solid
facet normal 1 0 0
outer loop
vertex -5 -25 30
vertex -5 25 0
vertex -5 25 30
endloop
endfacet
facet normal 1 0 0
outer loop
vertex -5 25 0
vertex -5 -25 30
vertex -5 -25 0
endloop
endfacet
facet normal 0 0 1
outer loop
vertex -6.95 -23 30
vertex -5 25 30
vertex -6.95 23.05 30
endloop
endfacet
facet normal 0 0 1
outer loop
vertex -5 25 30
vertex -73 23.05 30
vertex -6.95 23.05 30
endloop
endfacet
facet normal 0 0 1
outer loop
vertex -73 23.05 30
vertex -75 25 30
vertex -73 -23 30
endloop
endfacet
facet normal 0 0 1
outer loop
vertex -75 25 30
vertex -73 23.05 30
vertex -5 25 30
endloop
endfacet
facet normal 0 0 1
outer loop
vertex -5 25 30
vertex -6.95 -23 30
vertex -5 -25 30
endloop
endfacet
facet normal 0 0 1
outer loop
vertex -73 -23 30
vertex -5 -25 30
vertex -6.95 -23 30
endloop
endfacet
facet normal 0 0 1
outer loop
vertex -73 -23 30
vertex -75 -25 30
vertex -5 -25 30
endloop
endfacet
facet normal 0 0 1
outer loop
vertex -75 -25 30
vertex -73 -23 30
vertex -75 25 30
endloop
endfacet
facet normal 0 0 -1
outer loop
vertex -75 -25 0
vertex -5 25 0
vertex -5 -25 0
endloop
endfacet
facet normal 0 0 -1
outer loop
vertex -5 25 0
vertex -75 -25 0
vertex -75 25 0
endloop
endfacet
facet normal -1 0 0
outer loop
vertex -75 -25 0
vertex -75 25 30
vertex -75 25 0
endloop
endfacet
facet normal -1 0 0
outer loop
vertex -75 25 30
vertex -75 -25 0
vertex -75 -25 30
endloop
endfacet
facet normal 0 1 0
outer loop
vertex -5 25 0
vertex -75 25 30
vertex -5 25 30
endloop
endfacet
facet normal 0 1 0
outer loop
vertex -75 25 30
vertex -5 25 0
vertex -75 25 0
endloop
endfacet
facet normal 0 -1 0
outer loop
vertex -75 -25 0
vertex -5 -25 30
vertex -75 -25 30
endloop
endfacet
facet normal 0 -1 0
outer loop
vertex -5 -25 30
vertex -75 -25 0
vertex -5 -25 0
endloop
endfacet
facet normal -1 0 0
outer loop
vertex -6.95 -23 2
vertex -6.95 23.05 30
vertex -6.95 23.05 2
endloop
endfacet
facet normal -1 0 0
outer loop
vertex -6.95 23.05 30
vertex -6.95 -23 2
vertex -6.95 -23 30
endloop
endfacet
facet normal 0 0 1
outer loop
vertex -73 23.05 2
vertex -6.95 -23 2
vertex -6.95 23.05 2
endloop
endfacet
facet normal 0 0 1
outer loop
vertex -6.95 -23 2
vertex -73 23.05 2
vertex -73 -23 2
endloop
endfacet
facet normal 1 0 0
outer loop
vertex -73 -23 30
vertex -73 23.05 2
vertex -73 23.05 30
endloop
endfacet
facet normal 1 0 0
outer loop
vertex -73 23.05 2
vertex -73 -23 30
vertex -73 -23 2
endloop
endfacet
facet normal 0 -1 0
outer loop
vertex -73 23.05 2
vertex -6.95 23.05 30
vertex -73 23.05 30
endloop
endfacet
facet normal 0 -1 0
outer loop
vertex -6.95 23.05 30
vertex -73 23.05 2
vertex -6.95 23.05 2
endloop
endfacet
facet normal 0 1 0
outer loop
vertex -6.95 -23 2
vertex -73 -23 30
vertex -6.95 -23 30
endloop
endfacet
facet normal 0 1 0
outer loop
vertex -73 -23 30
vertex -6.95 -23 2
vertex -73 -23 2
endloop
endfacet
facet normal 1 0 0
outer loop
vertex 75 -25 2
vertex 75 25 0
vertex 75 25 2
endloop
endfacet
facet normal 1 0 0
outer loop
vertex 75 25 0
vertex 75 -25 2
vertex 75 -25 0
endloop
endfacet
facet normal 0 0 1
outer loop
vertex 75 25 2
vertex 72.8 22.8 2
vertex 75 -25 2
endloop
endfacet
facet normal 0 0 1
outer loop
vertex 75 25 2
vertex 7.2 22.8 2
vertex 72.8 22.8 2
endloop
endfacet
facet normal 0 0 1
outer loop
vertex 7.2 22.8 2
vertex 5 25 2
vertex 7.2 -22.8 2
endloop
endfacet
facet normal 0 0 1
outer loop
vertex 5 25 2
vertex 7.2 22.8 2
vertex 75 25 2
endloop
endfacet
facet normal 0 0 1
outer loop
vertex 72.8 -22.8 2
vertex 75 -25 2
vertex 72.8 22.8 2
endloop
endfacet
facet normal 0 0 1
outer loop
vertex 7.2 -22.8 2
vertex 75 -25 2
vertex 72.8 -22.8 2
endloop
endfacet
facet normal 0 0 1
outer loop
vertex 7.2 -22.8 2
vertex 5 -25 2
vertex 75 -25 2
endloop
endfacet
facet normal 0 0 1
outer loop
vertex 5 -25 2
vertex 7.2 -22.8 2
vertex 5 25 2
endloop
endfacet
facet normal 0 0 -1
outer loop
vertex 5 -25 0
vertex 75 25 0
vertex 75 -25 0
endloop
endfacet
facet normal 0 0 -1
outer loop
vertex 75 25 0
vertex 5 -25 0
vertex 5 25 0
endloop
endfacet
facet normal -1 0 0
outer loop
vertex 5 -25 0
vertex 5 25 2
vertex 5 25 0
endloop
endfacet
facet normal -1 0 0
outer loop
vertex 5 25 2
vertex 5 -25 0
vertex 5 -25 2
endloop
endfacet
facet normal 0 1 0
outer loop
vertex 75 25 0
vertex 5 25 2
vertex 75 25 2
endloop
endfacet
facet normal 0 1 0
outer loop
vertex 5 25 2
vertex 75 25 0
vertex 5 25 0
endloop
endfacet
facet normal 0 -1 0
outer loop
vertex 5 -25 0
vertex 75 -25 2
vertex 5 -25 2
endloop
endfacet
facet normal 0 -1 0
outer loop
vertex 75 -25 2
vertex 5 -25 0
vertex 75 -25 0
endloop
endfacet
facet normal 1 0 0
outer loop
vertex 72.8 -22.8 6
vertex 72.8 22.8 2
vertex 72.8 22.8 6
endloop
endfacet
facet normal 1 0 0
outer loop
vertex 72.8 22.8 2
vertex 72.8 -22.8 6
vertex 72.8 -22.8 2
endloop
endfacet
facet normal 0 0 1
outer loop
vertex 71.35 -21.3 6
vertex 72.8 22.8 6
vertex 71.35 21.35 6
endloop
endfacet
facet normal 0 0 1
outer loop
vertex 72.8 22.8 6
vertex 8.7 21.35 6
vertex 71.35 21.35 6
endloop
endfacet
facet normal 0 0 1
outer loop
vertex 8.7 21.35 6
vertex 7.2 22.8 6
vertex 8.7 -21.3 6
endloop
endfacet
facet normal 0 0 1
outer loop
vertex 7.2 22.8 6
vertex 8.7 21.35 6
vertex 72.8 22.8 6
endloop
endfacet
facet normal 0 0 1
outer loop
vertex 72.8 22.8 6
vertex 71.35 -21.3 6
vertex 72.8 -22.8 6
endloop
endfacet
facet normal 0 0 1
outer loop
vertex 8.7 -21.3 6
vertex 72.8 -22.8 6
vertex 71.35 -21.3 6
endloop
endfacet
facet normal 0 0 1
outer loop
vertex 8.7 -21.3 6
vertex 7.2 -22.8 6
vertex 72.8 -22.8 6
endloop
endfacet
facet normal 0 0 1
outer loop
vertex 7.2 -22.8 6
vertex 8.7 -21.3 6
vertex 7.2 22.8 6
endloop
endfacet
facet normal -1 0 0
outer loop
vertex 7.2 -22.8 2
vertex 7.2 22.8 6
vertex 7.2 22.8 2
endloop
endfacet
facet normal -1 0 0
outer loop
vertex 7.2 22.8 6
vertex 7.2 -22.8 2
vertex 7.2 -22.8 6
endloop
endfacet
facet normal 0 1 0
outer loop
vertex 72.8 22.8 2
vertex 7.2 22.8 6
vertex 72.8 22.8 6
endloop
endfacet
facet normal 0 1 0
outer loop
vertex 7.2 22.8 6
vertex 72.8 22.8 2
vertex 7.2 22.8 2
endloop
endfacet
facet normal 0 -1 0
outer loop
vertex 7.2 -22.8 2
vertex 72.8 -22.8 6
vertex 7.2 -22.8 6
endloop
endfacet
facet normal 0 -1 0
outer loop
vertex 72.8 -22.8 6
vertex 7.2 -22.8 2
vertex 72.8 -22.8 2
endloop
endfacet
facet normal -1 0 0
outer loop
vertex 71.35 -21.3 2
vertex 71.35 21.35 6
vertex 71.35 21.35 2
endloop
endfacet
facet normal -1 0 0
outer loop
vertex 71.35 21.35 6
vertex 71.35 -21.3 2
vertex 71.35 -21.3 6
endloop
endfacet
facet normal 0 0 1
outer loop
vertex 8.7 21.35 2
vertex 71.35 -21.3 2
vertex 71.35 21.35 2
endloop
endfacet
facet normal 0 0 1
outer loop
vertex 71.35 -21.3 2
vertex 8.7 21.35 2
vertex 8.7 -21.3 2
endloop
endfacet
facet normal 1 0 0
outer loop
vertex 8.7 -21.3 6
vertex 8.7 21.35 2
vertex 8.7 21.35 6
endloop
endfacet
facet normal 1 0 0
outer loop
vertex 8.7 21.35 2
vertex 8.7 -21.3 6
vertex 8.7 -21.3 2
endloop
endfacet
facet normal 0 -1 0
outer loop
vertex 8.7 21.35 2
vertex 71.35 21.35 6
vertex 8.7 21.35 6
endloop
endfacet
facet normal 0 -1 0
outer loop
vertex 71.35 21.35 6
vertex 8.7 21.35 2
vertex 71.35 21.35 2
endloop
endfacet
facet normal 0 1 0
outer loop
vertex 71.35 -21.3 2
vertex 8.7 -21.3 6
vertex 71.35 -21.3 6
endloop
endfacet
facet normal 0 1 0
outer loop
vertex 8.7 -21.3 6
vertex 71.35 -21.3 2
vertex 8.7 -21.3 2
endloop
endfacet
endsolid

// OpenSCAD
// Dimensions
outer_x = 70;           // Box/Lid outer length (X)
outer_y = 50;           // Box/Lid outer width (Y)
outer_z = 30;           // Box outer height (Z)
wall_thick = 2;         // Box wall thickness
floor_thick = 2;        // Box floor thickness
inner_x = outer_x - 2 * wall_thick;
inner_y = outer_y - 2 * wall_thick;
inner_z = outer_z - floor_thick;
// Add 0.05 mm to inner dimensions to avoid coplanar faces
inner_cavity_x = inner_x + 0.05;
inner_cavity_y = inner_y + 0.05;
inner_cavity_z = inner_z + 0.05;

plate_thick = 2;        // Lid plate thickness
lip_outer_x = 65.6;     // Lip outer length (X)
lip_outer_y = 45.6;     // Lip outer width (Y)
lip_wall_thick = 1.5;   // Lip wall thickness
lip_height = 4;         // Lip height (Z)
lip_inner_x = lip_outer_x - 2 * lip_wall_thick;
lip_inner_y = lip_outer_y - 2 * lip_wall_thick;
// Add 0.05 mm to inner dimensions to avoid coplanar faces
lip_inner_cavity_x = lip_inner_x + 0.05;
lip_inner_cavity_y = lip_inner_y + 0.05;
lip_inner_cavity_z = lip_height + 0.05;

// Placement
gap = 10;               // Gap between parts (mm)
box_x = -75;            // Box X origin (centers assembly at X=0)
lid_x = 5;              // Lid X origin (centers assembly at X=0)
y_origin = -25;         // Y origin (centers assembly at Y=0)

// Lip offsets relative to plate origin
lip_x_offset = (outer_x - lip_outer_x) / 2;
lip_y_offset = (outer_y - lip_outer_y) / 2;
lip_inner_x_offset = lip_x_offset + lip_wall_thick;
lip_inner_y_offset = lip_y_offset + lip_wall_thick;

$fn = 64;

// Part 1: Box
translate([box_x, y_origin, 0]) {
    difference() {
        cube([outer_x, outer_y, outer_z], center = false);
        // Inner cavity
        translate([wall_thick, wall_thick, floor_thick]) {
            cube([inner_cavity_x, inner_cavity_y, inner_cavity_z], center = false);
        }
    }
}

// Part 2: Lid
translate([lid_x, y_origin, 0]) {
    difference() {
        union() {
            // Plate
            cube([outer_x, outer_y, plate_thick], center = false);
            // Lip
            translate([lip_x_offset, lip_y_offset, plate_thick]) {
                cube([lip_outer_x, lip_outer_y, lip_height], center = false);
            }
        }
        // Inner cavity of the lip
        translate([lip_inner_x_offset, lip_inner_y_offset, plate_thick]) {
            cube([lip_inner_cavity_x, lip_inner_cavity_y, lip_inner_cavity_z], center = false);
        }
    }
}
